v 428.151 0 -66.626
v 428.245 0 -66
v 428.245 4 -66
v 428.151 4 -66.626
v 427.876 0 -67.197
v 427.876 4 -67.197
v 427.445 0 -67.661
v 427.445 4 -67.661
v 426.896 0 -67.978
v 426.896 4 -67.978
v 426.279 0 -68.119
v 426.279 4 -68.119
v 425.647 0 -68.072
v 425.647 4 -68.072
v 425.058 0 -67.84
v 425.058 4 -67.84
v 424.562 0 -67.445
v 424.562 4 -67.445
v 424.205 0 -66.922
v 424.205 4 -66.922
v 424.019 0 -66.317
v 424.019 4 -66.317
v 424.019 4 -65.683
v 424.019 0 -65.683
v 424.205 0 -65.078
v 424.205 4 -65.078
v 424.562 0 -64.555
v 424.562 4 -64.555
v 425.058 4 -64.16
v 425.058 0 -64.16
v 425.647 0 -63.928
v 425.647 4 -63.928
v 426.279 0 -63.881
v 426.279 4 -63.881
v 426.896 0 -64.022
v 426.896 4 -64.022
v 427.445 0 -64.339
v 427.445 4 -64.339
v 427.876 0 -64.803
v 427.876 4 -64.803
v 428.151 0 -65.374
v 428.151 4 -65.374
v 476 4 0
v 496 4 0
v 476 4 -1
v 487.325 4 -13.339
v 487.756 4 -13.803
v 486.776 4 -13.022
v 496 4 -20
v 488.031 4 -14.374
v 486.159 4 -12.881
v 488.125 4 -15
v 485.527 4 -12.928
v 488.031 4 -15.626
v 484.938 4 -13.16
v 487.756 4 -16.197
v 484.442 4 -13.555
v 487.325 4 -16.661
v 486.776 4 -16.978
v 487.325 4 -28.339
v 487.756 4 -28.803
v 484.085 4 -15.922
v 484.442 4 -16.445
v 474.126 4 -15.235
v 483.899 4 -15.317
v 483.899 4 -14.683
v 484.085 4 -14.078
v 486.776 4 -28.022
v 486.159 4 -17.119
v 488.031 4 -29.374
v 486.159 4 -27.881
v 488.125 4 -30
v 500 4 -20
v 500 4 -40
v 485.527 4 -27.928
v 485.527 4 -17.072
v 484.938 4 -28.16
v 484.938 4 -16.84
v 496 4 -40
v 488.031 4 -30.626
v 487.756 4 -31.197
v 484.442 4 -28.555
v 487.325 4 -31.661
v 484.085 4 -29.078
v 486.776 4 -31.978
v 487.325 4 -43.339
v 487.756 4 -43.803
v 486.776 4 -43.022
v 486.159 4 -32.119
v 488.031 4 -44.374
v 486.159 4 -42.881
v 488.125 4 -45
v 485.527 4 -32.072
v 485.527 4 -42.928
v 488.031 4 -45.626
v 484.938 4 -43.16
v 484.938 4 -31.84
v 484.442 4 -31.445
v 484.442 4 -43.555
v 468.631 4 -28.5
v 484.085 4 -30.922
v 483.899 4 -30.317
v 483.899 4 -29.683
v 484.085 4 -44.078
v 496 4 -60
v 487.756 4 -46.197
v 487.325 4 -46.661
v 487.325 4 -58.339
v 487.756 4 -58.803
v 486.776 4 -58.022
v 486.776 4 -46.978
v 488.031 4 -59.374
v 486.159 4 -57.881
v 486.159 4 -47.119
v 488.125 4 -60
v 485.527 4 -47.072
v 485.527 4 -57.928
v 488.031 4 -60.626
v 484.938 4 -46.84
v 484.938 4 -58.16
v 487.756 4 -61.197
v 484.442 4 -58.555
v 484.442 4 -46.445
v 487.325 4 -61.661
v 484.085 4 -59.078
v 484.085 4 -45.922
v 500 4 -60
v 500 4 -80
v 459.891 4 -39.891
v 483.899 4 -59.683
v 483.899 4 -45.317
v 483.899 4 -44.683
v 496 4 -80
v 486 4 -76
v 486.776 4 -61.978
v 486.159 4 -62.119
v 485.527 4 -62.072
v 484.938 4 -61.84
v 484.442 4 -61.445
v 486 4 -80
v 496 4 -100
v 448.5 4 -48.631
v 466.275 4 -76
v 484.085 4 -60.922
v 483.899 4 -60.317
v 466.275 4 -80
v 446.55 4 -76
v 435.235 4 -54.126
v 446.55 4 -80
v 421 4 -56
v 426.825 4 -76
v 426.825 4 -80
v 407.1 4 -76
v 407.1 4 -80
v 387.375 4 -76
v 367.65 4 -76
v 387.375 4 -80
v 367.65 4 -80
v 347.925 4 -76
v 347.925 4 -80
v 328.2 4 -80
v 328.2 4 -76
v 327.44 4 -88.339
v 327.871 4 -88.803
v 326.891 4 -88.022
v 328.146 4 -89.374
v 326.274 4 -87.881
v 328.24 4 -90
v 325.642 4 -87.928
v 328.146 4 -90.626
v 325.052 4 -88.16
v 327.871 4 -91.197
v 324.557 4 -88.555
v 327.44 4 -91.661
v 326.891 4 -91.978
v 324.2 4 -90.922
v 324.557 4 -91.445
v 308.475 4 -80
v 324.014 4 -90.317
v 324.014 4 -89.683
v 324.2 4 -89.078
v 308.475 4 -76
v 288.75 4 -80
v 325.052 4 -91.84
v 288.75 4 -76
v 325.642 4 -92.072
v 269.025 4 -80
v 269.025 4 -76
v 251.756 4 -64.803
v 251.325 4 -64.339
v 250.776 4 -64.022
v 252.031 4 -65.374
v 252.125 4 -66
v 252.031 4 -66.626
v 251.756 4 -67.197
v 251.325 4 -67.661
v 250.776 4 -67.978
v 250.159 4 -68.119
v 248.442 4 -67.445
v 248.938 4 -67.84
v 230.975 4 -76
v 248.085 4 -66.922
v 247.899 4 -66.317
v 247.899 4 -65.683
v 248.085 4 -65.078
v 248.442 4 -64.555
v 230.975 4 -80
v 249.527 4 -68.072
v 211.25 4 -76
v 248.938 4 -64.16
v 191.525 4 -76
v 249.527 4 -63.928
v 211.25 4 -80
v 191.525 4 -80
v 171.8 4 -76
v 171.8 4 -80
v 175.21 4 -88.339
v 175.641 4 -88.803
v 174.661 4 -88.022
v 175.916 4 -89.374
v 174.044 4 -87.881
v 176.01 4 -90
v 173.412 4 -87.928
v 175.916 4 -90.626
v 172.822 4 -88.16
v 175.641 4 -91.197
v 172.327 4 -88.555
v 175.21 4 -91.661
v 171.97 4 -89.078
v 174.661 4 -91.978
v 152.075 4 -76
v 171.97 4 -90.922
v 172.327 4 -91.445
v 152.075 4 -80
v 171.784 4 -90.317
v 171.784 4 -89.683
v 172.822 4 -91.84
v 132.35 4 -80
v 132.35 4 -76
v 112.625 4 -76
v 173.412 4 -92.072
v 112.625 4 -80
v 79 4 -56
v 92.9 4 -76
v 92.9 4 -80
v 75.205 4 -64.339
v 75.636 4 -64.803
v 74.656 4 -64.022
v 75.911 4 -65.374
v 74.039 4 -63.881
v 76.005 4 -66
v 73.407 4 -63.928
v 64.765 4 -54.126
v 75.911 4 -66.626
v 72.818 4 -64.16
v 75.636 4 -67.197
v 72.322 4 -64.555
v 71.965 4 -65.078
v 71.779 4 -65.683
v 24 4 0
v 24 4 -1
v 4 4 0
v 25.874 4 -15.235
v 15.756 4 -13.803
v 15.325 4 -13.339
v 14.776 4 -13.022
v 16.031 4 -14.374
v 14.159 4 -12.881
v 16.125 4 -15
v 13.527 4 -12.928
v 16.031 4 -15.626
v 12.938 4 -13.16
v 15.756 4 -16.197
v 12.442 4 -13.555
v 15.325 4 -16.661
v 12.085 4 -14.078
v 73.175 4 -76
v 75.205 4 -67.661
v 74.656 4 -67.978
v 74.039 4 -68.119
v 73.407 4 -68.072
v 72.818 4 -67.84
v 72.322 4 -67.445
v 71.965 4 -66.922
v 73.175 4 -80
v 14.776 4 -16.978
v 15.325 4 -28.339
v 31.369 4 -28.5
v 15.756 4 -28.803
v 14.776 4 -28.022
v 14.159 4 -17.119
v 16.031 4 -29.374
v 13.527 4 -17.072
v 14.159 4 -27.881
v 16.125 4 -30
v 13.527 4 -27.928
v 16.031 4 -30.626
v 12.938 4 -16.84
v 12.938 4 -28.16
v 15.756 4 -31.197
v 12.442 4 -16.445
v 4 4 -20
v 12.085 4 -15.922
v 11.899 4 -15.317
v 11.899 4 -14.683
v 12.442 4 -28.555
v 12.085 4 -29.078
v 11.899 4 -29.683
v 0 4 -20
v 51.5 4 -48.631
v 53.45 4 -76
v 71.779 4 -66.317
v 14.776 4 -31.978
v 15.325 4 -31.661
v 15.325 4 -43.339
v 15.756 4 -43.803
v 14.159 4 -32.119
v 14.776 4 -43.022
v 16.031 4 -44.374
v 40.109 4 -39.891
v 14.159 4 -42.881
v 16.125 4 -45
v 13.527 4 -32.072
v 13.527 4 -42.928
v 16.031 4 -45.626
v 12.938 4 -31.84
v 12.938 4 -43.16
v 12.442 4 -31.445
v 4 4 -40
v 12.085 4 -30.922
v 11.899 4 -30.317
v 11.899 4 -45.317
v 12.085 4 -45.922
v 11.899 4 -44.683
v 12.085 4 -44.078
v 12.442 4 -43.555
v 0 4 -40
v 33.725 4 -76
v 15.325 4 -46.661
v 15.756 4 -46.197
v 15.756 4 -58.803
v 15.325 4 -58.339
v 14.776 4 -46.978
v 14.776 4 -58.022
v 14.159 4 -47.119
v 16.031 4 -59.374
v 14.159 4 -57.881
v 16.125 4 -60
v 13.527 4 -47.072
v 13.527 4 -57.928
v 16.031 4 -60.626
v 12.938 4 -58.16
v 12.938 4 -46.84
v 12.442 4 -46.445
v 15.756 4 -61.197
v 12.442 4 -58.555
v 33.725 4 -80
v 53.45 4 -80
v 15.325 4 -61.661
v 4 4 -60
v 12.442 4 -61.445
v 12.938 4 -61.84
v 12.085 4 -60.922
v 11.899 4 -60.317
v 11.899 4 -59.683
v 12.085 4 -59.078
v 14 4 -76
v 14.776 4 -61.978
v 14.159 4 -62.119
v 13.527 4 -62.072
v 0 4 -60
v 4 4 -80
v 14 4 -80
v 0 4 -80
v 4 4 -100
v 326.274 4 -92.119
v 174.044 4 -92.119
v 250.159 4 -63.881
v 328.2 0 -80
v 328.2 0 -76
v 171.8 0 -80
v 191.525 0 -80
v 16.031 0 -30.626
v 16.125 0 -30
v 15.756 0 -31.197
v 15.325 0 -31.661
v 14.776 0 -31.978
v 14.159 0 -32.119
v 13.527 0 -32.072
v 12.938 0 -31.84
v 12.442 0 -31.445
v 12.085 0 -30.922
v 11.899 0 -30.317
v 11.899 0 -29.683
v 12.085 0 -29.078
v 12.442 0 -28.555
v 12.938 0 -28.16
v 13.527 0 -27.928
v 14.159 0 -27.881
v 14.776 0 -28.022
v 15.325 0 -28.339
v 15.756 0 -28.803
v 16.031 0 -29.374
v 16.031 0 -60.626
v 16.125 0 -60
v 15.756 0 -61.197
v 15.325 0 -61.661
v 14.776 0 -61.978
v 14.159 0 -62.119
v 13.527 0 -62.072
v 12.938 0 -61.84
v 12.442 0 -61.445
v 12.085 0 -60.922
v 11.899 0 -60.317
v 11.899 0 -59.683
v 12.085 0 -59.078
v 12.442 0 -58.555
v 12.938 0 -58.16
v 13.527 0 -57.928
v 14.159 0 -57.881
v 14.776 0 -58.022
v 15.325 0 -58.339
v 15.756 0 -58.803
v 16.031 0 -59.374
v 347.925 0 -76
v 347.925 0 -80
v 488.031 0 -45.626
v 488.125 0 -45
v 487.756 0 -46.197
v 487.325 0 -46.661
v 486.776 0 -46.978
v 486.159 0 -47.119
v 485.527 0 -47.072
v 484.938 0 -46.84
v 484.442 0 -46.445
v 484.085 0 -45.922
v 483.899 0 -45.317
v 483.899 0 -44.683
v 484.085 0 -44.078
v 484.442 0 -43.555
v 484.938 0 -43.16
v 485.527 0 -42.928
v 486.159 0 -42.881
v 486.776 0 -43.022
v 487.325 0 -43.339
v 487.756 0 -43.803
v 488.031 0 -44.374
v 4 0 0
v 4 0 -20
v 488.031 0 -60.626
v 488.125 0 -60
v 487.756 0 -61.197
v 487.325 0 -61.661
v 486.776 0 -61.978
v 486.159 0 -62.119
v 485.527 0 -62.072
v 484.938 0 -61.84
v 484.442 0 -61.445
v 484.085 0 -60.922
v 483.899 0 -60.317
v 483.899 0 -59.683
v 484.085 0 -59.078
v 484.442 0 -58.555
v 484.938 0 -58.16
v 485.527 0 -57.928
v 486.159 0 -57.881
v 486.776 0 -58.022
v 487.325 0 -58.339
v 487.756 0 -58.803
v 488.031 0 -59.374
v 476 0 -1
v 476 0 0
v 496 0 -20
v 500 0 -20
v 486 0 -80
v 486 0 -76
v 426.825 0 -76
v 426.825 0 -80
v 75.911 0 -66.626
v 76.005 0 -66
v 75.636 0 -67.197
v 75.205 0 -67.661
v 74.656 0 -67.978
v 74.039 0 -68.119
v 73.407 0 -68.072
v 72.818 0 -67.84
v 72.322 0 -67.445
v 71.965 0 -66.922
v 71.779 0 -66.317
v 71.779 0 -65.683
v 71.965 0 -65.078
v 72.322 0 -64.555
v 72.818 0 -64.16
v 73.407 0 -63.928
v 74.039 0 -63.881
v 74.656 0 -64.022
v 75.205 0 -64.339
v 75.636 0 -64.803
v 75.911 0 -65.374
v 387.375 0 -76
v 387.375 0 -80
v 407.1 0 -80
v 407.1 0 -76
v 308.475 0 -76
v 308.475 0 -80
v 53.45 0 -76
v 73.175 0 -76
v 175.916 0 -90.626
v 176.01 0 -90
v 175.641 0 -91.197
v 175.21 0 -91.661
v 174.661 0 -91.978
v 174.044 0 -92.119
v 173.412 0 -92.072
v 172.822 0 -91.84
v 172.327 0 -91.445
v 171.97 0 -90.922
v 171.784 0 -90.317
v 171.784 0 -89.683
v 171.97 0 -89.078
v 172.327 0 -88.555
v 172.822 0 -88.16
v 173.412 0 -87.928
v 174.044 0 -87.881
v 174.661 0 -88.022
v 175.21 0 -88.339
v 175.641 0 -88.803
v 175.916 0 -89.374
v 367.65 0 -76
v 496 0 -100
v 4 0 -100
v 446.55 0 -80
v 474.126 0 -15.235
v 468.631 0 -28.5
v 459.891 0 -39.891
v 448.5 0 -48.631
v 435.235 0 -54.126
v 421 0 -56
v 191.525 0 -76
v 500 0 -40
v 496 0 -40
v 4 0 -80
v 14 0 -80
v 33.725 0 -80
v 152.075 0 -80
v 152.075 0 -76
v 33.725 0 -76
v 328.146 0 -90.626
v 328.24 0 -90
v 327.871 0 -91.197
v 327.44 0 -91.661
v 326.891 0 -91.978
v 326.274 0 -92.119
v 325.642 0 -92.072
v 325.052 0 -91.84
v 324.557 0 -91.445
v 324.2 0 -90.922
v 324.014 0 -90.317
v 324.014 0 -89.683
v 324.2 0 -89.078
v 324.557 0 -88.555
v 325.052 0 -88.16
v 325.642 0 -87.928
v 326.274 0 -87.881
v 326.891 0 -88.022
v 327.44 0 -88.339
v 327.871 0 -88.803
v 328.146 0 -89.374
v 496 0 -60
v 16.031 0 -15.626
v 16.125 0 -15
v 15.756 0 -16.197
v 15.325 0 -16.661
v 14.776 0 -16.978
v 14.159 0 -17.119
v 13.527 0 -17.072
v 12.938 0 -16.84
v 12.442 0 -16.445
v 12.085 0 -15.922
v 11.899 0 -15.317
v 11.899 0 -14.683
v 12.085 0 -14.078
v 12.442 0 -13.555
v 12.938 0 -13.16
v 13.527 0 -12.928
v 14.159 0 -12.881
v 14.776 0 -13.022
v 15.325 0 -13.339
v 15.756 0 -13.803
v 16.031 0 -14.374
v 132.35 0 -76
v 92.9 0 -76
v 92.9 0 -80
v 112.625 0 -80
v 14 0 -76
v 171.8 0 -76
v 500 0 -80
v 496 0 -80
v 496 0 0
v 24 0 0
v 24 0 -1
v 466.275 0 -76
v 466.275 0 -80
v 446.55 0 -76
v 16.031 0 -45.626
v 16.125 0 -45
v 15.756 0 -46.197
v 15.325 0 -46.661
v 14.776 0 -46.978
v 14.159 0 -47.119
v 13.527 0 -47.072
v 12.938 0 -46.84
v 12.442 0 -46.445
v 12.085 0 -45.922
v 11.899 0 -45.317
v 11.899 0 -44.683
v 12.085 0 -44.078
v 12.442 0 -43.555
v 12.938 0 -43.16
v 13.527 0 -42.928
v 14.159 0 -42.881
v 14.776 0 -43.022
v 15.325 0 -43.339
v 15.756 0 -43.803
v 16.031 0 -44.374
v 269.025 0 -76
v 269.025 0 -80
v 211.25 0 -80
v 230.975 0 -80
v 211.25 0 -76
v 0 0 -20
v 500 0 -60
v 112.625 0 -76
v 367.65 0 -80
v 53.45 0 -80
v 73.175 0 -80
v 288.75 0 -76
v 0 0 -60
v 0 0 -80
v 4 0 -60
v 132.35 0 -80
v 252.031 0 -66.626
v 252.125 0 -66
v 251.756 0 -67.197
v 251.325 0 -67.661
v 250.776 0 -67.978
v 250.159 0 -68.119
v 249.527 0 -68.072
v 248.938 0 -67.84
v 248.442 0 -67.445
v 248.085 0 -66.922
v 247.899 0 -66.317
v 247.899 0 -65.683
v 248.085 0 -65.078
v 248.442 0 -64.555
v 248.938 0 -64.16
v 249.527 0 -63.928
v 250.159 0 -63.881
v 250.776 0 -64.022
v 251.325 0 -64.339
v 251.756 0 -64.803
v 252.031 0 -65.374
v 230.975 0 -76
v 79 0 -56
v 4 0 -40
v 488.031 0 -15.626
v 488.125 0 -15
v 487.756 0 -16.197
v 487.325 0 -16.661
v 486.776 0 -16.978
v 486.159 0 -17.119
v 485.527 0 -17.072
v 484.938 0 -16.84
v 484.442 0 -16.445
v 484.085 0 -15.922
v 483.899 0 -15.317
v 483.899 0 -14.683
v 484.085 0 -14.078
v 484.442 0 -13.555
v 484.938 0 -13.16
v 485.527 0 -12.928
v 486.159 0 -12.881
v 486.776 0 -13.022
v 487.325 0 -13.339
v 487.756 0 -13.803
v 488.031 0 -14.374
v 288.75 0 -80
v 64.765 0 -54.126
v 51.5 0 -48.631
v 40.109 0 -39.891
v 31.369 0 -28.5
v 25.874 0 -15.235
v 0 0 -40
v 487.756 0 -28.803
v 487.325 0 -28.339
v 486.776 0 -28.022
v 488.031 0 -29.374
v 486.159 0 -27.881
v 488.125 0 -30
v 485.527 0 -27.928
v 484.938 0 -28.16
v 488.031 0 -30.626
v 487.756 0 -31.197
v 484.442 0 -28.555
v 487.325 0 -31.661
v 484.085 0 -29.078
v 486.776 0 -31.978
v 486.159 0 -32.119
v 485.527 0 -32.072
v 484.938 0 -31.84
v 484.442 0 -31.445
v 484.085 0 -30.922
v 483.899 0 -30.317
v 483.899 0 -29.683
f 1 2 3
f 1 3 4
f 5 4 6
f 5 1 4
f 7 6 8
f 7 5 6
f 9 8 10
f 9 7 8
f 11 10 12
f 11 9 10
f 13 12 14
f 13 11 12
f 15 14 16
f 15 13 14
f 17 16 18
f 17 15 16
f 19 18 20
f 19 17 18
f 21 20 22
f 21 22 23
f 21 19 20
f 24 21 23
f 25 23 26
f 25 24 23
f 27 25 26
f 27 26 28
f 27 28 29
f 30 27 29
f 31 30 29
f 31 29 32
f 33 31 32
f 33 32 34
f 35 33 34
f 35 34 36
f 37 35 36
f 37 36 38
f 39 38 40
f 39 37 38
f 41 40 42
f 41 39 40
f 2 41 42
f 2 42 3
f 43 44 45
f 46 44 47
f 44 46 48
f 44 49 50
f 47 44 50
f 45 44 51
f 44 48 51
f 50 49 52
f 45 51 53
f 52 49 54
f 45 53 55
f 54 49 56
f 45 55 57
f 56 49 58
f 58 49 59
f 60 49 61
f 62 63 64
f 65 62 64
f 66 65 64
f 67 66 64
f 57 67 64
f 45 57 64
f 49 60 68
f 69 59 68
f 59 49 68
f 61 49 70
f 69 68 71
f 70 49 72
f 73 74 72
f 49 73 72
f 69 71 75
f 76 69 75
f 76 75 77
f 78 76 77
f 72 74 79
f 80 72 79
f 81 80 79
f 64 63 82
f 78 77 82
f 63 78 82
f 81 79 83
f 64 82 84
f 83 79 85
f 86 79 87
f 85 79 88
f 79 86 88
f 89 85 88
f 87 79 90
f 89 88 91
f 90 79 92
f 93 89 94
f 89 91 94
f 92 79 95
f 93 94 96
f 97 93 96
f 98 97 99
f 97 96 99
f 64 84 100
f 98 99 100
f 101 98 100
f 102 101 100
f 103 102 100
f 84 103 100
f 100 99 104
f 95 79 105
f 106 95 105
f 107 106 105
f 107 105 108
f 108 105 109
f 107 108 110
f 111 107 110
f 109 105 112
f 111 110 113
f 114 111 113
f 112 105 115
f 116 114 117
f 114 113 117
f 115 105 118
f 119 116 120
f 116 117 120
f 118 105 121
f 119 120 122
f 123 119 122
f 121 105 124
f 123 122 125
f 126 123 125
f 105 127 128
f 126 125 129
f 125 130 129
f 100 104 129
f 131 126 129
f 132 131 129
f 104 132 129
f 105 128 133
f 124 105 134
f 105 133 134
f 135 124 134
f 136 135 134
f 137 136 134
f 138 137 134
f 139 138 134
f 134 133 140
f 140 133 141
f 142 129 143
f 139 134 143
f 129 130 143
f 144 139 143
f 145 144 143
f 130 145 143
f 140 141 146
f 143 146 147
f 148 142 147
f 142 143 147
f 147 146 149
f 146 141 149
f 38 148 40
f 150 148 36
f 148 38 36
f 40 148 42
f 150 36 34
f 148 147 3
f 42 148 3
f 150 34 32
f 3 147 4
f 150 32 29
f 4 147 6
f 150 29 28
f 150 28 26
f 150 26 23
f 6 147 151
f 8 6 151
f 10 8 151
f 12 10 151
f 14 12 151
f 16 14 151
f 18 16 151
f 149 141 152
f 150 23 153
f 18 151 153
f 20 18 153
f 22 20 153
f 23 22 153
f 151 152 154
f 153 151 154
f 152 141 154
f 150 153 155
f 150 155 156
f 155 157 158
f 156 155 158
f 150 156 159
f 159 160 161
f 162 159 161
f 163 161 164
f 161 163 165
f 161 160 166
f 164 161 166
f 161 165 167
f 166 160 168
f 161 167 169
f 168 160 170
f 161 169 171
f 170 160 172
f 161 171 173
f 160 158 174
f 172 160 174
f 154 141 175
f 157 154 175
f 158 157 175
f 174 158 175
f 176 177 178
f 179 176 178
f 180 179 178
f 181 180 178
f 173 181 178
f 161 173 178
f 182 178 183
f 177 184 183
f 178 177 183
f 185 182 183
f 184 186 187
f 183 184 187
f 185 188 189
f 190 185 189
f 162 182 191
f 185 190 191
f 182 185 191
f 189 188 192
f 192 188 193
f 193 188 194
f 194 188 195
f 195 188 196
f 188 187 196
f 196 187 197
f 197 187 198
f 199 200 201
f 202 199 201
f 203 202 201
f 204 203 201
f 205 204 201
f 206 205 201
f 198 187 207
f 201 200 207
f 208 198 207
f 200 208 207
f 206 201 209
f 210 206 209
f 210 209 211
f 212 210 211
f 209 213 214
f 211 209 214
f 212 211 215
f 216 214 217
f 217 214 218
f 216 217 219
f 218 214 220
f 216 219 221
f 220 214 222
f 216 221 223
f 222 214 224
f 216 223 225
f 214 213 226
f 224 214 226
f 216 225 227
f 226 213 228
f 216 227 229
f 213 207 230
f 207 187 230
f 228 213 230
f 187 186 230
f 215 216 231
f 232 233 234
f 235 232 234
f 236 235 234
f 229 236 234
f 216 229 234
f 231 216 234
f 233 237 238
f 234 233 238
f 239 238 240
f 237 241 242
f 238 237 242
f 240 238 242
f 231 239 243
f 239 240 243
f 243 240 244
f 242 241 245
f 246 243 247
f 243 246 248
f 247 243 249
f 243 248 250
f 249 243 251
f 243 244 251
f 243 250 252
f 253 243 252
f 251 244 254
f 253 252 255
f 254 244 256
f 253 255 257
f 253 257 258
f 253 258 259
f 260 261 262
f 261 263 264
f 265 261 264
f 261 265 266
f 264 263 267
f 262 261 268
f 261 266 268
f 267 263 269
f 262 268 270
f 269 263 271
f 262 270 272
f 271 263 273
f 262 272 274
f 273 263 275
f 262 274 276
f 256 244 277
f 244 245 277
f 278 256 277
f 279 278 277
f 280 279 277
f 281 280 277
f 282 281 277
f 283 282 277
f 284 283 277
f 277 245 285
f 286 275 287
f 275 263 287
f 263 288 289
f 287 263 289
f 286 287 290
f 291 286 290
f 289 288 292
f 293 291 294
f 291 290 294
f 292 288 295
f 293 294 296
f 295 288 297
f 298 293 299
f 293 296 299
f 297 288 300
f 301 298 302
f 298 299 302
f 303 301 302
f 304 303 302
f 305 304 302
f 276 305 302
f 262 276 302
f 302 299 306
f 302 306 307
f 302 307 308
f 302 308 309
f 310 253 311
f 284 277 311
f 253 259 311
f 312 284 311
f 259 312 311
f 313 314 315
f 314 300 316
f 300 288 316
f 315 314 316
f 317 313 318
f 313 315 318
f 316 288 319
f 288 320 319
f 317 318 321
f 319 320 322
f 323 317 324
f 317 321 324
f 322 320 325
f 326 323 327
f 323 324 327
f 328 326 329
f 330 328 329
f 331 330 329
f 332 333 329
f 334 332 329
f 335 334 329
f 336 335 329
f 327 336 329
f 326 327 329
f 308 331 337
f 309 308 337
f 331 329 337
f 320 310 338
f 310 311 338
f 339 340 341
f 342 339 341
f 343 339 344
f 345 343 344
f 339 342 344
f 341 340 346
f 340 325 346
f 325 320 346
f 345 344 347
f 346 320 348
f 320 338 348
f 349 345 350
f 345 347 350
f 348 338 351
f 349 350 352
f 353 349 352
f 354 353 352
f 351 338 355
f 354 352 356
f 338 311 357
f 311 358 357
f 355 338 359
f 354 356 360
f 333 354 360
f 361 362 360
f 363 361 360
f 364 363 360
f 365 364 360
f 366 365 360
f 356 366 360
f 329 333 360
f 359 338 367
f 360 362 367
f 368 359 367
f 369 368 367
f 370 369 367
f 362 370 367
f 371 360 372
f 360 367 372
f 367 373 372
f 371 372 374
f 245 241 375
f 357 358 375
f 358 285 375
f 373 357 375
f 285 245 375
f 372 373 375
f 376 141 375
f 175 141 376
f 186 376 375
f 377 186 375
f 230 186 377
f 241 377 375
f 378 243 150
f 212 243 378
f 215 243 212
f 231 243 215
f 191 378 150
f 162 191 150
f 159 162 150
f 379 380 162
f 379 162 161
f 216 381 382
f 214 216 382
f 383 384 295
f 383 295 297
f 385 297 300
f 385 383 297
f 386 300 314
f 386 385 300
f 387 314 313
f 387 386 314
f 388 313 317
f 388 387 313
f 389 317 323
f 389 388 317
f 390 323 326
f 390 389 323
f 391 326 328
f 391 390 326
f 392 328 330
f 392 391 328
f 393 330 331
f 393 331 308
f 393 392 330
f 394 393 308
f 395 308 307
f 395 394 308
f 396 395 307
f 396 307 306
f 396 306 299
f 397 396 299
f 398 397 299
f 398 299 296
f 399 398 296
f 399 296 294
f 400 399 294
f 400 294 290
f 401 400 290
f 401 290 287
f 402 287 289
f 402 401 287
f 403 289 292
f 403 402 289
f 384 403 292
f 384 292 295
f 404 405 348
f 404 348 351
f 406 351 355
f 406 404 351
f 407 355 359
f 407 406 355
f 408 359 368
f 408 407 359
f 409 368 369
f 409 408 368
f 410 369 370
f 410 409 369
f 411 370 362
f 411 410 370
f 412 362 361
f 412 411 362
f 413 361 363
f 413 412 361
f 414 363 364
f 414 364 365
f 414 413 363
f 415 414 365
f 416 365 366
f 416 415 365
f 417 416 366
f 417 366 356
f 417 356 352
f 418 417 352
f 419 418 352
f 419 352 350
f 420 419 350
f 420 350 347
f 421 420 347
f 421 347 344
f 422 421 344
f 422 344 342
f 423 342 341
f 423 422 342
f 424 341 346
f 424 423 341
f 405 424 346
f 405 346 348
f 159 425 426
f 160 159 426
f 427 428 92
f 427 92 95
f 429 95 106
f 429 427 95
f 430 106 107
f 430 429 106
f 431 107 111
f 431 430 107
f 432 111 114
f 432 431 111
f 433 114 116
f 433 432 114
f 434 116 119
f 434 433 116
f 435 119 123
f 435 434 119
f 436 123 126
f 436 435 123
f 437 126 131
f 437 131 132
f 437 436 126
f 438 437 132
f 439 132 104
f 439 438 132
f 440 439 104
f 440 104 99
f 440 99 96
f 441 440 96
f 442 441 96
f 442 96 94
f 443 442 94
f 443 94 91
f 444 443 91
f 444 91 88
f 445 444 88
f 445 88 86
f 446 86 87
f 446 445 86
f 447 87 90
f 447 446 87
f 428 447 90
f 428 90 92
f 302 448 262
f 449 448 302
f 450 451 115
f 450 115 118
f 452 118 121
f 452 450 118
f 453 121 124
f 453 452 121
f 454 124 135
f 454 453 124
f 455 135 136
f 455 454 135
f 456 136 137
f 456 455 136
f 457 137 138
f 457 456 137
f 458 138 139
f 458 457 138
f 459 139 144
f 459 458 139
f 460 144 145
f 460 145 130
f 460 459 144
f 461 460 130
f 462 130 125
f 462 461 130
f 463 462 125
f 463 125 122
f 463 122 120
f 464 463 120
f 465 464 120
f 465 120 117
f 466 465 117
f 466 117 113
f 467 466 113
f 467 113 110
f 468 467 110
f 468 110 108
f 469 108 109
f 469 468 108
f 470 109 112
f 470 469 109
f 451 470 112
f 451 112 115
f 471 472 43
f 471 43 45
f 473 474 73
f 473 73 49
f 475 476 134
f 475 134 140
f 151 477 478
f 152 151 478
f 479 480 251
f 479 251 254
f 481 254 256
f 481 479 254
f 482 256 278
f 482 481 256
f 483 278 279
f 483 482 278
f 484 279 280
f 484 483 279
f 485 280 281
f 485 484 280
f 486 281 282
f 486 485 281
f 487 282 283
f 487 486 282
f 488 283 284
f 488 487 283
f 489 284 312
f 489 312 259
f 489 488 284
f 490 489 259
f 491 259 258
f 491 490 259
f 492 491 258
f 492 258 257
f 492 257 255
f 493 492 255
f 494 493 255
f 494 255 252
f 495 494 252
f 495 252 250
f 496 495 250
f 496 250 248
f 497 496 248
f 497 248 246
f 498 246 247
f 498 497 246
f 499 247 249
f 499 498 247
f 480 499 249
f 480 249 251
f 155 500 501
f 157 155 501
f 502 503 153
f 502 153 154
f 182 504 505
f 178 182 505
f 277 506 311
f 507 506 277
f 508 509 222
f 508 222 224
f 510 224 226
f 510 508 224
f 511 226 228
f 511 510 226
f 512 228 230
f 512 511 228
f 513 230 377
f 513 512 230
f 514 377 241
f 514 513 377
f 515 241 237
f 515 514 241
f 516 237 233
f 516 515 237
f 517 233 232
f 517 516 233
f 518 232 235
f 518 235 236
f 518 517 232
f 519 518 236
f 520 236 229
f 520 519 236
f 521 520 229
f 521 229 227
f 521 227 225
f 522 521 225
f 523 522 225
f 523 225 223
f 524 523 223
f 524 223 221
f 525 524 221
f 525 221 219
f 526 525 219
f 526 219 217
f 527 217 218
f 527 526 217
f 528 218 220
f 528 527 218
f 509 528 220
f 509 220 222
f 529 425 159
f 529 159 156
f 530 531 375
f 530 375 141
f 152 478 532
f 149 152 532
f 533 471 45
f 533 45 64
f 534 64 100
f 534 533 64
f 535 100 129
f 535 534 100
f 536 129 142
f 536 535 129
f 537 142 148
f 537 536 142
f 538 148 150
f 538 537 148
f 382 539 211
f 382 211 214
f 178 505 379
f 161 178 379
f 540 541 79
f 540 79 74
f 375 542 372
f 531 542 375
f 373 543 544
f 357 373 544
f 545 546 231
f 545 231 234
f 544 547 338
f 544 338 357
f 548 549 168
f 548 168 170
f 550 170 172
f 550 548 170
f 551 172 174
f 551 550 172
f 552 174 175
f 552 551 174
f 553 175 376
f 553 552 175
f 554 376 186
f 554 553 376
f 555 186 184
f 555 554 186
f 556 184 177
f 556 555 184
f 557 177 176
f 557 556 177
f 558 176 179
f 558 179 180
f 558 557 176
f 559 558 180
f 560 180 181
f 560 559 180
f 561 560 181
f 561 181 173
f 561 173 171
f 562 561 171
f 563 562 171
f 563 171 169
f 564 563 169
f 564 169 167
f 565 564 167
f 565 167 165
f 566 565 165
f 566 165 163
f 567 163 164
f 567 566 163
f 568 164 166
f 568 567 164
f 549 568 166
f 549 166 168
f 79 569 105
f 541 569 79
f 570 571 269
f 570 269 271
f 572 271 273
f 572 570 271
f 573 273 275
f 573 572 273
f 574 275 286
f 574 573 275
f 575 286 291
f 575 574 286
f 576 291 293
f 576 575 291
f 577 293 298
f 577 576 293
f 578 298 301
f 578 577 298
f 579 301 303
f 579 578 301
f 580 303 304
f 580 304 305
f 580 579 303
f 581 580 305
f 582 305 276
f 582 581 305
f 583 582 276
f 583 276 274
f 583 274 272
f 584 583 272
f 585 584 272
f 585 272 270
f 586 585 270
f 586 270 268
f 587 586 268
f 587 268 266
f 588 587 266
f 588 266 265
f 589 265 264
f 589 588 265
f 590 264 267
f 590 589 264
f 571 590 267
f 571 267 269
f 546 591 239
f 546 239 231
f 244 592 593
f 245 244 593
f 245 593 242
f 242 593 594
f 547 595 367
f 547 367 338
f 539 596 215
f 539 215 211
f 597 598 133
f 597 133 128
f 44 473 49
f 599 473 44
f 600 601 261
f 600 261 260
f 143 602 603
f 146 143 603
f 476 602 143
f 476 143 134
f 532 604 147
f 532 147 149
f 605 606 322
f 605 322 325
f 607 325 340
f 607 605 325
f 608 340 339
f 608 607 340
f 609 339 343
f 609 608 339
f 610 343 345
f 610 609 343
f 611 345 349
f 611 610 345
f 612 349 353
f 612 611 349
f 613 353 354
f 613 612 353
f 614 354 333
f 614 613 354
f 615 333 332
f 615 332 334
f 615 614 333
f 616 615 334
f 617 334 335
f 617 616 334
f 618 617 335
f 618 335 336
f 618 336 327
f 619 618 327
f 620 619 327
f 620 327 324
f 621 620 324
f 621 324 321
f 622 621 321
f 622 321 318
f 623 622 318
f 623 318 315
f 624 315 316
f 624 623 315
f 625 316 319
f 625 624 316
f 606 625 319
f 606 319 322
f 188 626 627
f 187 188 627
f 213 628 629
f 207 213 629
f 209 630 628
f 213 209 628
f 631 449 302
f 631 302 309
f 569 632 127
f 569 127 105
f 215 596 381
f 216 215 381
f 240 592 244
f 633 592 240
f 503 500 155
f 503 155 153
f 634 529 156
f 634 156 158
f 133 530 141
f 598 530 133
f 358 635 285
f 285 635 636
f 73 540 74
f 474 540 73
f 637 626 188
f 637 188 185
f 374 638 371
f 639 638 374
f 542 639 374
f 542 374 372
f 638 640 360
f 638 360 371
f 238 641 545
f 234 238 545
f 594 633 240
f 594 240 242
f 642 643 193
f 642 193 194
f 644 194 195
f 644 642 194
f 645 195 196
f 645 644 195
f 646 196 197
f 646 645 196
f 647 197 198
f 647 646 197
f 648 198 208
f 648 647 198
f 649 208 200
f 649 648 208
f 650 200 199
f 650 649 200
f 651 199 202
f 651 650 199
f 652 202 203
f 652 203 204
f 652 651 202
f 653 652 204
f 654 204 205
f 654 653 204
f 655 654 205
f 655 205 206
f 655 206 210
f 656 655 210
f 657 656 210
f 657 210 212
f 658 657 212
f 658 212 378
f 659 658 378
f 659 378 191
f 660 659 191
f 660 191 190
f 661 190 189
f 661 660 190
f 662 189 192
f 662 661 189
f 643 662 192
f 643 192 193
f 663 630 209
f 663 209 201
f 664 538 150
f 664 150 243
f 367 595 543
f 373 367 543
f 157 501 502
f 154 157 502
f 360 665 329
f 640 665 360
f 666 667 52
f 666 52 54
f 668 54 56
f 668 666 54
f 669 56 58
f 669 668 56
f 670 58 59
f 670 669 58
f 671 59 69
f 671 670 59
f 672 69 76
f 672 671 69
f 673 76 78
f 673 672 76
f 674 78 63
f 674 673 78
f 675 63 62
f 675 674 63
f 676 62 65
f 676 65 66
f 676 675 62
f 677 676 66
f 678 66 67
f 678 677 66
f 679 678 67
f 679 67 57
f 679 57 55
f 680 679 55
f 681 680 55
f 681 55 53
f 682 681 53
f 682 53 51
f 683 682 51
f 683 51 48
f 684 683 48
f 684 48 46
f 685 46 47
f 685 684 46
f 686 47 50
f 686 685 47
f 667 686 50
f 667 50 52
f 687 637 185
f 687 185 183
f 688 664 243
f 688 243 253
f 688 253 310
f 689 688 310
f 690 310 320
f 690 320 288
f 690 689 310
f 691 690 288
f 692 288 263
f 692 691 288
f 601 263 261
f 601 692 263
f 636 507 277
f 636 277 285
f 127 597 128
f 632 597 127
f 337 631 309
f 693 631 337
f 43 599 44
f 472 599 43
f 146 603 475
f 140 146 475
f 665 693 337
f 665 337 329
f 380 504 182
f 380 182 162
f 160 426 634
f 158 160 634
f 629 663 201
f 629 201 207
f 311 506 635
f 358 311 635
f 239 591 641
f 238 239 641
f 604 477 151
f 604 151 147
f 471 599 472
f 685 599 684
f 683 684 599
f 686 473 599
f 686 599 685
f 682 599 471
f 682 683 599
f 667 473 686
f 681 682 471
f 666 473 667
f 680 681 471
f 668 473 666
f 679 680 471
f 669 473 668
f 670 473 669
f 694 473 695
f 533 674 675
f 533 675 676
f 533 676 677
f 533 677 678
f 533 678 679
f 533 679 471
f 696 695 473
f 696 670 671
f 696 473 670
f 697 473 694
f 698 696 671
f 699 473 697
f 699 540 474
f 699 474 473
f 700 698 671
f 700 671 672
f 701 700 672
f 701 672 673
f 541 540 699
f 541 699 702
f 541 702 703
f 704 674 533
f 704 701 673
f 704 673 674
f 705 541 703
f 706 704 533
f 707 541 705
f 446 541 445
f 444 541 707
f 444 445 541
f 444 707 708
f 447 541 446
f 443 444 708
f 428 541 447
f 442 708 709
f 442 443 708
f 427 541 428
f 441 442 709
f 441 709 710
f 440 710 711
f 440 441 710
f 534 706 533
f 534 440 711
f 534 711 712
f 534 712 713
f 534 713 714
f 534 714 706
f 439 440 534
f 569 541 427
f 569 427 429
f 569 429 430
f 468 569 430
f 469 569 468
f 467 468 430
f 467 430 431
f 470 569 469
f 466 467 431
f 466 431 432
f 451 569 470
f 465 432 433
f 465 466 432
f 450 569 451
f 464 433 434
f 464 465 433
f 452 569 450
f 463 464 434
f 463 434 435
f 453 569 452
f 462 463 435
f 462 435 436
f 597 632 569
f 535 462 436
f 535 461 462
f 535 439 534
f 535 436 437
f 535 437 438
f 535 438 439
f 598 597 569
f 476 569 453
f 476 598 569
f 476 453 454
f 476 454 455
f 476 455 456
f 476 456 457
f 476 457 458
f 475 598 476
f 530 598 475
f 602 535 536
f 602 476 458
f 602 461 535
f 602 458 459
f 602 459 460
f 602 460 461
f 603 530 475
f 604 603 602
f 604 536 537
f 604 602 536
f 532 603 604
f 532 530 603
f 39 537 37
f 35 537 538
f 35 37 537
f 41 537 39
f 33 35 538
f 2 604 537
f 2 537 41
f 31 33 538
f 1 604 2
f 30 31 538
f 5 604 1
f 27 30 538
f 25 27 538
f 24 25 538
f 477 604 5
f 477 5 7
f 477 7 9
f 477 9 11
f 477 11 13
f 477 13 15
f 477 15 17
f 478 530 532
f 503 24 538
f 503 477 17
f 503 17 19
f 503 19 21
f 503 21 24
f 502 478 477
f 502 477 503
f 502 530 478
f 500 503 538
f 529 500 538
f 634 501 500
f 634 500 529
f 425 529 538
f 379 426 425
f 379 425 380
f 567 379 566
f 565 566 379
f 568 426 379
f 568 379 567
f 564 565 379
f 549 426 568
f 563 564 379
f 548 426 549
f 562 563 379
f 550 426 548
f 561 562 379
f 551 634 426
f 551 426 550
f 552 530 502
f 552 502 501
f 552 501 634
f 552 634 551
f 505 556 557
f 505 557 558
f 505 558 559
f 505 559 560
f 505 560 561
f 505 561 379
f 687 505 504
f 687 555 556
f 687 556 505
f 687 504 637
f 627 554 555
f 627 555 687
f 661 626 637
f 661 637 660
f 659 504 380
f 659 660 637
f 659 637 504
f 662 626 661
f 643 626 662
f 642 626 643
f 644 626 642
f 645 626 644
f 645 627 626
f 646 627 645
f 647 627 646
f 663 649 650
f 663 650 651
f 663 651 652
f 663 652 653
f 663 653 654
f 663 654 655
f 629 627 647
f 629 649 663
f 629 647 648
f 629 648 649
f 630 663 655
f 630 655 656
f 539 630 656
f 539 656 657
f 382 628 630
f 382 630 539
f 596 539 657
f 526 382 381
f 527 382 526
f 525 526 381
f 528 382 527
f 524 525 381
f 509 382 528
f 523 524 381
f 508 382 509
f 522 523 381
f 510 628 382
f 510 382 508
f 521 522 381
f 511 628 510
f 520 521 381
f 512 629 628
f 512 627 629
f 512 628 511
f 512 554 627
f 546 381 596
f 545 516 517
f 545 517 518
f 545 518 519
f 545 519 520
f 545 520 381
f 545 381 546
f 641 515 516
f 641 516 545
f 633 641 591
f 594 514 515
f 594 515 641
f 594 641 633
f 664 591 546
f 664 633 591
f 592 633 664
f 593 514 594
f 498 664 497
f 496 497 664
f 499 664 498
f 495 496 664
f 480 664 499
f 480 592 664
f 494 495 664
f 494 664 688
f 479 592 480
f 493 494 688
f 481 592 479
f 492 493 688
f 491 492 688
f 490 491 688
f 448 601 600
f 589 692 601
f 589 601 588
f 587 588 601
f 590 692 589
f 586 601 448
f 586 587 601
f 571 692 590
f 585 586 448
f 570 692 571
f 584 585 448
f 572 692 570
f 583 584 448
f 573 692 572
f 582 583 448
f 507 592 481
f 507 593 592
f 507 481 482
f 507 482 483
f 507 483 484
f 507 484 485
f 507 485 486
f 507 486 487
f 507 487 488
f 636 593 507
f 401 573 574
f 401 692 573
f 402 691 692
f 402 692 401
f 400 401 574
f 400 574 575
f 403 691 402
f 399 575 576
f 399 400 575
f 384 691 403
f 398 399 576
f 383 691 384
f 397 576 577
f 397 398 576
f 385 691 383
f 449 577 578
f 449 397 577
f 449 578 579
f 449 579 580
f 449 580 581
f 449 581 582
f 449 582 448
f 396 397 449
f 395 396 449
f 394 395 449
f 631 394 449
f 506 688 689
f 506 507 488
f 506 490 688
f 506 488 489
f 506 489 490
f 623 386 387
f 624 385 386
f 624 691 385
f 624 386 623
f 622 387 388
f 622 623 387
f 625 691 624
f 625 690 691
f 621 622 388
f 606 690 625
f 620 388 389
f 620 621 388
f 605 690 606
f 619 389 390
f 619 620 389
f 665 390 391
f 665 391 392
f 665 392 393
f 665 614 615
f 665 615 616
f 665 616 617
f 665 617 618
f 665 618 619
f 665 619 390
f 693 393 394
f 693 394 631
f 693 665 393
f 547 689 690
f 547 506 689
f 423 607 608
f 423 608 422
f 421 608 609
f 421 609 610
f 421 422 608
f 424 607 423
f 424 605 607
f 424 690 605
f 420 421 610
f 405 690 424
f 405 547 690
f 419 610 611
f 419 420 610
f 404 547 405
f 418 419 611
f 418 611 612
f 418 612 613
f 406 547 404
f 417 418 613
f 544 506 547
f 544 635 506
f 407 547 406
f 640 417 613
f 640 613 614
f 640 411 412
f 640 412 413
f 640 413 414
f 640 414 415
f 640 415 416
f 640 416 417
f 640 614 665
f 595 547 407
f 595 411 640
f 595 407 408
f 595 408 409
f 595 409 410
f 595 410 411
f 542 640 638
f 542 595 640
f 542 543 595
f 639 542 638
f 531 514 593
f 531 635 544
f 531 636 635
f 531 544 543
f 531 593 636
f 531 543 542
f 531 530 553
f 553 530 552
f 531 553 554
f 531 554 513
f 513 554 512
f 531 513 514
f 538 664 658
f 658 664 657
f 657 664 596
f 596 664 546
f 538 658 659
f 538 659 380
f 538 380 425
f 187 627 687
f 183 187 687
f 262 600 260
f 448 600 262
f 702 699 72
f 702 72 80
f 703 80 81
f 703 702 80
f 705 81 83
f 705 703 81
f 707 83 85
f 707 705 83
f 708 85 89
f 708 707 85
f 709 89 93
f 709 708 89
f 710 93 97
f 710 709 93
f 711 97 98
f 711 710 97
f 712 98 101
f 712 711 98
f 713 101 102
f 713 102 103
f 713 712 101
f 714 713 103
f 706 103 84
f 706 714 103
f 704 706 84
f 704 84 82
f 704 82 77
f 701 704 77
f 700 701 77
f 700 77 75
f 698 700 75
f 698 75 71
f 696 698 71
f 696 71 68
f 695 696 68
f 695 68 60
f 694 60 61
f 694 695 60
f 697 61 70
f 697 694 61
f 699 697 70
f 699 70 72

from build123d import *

# Parameters (mm, degrees)
SKETCH1_R           = 2.125
SKETCH1_W           = 19.725
SKETCH1_H           = 4
BOSS_EXTRUDE1_DEPTH = 4


with BuildPart() as part:
    # Sketch1 → Boss-Extrude1 (new body)
    with BuildSketch(Plane(origin=(0, 0, 0), x_dir=(1, 0, 0), z_dir=(0, 1, 0))):
        with BuildLine():
            Line((4, 0), (4, 20))
            Line((4, 20), (0, 20))
            Line((0, 20), (0, 40))
            Line((0, 40), (4, 40))
            Line((4, 40), (4, 60))
            Line((4, 60), (0, 60))
            Line((0, 60), (0, 80))
            Line((0, 80), (4, 80))
            Line((4, 80), (4, 100))
            Line((4, 100), (250, 100))
            Line((250, 100), (496, 100))
            Line((496, 100), (496, 80))
            Line((496, 80), (500, 80))
            Line((500, 80), (500, 60))
            Line((500, 60), (496, 60))
            Line((496, 60), (496, 40))
            Line((496, 40), (500, 40))
            Line((500, 40), (500, 20))
            Line((500, 20), (496, 20))
            Line((496, 20), (496, 0))
            Line((496, 0), (476, 0))
            Line((476, 0), (476, 1))
            ThreePointArc((476, 1), (459.890872965, 39.890872965), (421, 56))
            Line((421, 56), (79, 56))
            ThreePointArc((79, 56), (40.109127035, 39.890872965), (24, 1))
            Line((24, 1), (24, 0))
            Line((24, 0), (4, 0))
        make_face()
        with Locations((14, 15)):
            Circle(SKETCH1_R, mode=Mode.SUBTRACT)
        with Locations((14, 30)):
            Circle(SKETCH1_R, mode=Mode.SUBTRACT)
        with Locations((173.885, 90)):
            Circle(SKETCH1_R, mode=Mode.SUBTRACT)
        with Locations((326.115, 90)):
            Circle(SKETCH1_R, mode=Mode.SUBTRACT)
        with Locations((486, 30)):
            Circle(SKETCH1_R, mode=Mode.SUBTRACT)
        with Locations((486, 15)):
            Circle(SKETCH1_R, mode=Mode.SUBTRACT)
        with Locations((14, 60)):
            Circle(SKETCH1_R, mode=Mode.SUBTRACT)
        with Locations((14, 45)):
            Circle(SKETCH1_R, mode=Mode.SUBTRACT)
        with Locations((486, 45)):
            Circle(SKETCH1_R, mode=Mode.SUBTRACT)
        with Locations((486, 60)):
            Circle(SKETCH1_R, mode=Mode.SUBTRACT)
        with Locations((73.88, 66)):
            Circle(SKETCH1_R, mode=Mode.SUBTRACT)
        with Locations((426.12, 66)):
            Circle(SKETCH1_R, mode=Mode.SUBTRACT)
        with Locations((250, 66)):
            Circle(SKETCH1_R, mode=Mode.SUBTRACT)
        with Locations((63.3125, 78)):
            Rectangle(SKETCH1_W, SKETCH1_H, mode=Mode.SUBTRACT)
        with Locations((23.8625, 78)):
            Rectangle(SKETCH1_W, SKETCH1_H, mode=Mode.SUBTRACT)
        with Locations((102.7625, 78)):
            Rectangle(SKETCH1_W, SKETCH1_H, mode=Mode.SUBTRACT)
        with Locations((142.2125, 78)):
            Rectangle(SKETCH1_W, SKETCH1_H, mode=Mode.SUBTRACT)
        with Locations((181.6625, 78)):
            Rectangle(SKETCH1_W, SKETCH1_H, mode=Mode.SUBTRACT)
        with Locations((221.1125, 78)):
            Rectangle(SKETCH1_W, SKETCH1_H, mode=Mode.SUBTRACT)
        with Locations((278.8875, 78)):
            Rectangle(SKETCH1_W, SKETCH1_H, mode=Mode.SUBTRACT)
        with Locations((318.3375, 78)):
            Rectangle(SKETCH1_W, SKETCH1_H, mode=Mode.SUBTRACT)
        with Locations((357.7875, 78)):
            Rectangle(SKETCH1_W, SKETCH1_H, mode=Mode.SUBTRACT)
        with Locations((397.2375, 78)):
            Rectangle(SKETCH1_W, SKETCH1_H, mode=Mode.SUBTRACT)
        with Locations((436.6875, 78)):
            Rectangle(SKETCH1_W, SKETCH1_H, mode=Mode.SUBTRACT)
        with Locations((476.1375, 78)):
            Rectangle(SKETCH1_W, SKETCH1_H, mode=Mode.SUBTRACT)
    extrude(amount=BOSS_EXTRUDE1_DEPTH)


solid = part.part
